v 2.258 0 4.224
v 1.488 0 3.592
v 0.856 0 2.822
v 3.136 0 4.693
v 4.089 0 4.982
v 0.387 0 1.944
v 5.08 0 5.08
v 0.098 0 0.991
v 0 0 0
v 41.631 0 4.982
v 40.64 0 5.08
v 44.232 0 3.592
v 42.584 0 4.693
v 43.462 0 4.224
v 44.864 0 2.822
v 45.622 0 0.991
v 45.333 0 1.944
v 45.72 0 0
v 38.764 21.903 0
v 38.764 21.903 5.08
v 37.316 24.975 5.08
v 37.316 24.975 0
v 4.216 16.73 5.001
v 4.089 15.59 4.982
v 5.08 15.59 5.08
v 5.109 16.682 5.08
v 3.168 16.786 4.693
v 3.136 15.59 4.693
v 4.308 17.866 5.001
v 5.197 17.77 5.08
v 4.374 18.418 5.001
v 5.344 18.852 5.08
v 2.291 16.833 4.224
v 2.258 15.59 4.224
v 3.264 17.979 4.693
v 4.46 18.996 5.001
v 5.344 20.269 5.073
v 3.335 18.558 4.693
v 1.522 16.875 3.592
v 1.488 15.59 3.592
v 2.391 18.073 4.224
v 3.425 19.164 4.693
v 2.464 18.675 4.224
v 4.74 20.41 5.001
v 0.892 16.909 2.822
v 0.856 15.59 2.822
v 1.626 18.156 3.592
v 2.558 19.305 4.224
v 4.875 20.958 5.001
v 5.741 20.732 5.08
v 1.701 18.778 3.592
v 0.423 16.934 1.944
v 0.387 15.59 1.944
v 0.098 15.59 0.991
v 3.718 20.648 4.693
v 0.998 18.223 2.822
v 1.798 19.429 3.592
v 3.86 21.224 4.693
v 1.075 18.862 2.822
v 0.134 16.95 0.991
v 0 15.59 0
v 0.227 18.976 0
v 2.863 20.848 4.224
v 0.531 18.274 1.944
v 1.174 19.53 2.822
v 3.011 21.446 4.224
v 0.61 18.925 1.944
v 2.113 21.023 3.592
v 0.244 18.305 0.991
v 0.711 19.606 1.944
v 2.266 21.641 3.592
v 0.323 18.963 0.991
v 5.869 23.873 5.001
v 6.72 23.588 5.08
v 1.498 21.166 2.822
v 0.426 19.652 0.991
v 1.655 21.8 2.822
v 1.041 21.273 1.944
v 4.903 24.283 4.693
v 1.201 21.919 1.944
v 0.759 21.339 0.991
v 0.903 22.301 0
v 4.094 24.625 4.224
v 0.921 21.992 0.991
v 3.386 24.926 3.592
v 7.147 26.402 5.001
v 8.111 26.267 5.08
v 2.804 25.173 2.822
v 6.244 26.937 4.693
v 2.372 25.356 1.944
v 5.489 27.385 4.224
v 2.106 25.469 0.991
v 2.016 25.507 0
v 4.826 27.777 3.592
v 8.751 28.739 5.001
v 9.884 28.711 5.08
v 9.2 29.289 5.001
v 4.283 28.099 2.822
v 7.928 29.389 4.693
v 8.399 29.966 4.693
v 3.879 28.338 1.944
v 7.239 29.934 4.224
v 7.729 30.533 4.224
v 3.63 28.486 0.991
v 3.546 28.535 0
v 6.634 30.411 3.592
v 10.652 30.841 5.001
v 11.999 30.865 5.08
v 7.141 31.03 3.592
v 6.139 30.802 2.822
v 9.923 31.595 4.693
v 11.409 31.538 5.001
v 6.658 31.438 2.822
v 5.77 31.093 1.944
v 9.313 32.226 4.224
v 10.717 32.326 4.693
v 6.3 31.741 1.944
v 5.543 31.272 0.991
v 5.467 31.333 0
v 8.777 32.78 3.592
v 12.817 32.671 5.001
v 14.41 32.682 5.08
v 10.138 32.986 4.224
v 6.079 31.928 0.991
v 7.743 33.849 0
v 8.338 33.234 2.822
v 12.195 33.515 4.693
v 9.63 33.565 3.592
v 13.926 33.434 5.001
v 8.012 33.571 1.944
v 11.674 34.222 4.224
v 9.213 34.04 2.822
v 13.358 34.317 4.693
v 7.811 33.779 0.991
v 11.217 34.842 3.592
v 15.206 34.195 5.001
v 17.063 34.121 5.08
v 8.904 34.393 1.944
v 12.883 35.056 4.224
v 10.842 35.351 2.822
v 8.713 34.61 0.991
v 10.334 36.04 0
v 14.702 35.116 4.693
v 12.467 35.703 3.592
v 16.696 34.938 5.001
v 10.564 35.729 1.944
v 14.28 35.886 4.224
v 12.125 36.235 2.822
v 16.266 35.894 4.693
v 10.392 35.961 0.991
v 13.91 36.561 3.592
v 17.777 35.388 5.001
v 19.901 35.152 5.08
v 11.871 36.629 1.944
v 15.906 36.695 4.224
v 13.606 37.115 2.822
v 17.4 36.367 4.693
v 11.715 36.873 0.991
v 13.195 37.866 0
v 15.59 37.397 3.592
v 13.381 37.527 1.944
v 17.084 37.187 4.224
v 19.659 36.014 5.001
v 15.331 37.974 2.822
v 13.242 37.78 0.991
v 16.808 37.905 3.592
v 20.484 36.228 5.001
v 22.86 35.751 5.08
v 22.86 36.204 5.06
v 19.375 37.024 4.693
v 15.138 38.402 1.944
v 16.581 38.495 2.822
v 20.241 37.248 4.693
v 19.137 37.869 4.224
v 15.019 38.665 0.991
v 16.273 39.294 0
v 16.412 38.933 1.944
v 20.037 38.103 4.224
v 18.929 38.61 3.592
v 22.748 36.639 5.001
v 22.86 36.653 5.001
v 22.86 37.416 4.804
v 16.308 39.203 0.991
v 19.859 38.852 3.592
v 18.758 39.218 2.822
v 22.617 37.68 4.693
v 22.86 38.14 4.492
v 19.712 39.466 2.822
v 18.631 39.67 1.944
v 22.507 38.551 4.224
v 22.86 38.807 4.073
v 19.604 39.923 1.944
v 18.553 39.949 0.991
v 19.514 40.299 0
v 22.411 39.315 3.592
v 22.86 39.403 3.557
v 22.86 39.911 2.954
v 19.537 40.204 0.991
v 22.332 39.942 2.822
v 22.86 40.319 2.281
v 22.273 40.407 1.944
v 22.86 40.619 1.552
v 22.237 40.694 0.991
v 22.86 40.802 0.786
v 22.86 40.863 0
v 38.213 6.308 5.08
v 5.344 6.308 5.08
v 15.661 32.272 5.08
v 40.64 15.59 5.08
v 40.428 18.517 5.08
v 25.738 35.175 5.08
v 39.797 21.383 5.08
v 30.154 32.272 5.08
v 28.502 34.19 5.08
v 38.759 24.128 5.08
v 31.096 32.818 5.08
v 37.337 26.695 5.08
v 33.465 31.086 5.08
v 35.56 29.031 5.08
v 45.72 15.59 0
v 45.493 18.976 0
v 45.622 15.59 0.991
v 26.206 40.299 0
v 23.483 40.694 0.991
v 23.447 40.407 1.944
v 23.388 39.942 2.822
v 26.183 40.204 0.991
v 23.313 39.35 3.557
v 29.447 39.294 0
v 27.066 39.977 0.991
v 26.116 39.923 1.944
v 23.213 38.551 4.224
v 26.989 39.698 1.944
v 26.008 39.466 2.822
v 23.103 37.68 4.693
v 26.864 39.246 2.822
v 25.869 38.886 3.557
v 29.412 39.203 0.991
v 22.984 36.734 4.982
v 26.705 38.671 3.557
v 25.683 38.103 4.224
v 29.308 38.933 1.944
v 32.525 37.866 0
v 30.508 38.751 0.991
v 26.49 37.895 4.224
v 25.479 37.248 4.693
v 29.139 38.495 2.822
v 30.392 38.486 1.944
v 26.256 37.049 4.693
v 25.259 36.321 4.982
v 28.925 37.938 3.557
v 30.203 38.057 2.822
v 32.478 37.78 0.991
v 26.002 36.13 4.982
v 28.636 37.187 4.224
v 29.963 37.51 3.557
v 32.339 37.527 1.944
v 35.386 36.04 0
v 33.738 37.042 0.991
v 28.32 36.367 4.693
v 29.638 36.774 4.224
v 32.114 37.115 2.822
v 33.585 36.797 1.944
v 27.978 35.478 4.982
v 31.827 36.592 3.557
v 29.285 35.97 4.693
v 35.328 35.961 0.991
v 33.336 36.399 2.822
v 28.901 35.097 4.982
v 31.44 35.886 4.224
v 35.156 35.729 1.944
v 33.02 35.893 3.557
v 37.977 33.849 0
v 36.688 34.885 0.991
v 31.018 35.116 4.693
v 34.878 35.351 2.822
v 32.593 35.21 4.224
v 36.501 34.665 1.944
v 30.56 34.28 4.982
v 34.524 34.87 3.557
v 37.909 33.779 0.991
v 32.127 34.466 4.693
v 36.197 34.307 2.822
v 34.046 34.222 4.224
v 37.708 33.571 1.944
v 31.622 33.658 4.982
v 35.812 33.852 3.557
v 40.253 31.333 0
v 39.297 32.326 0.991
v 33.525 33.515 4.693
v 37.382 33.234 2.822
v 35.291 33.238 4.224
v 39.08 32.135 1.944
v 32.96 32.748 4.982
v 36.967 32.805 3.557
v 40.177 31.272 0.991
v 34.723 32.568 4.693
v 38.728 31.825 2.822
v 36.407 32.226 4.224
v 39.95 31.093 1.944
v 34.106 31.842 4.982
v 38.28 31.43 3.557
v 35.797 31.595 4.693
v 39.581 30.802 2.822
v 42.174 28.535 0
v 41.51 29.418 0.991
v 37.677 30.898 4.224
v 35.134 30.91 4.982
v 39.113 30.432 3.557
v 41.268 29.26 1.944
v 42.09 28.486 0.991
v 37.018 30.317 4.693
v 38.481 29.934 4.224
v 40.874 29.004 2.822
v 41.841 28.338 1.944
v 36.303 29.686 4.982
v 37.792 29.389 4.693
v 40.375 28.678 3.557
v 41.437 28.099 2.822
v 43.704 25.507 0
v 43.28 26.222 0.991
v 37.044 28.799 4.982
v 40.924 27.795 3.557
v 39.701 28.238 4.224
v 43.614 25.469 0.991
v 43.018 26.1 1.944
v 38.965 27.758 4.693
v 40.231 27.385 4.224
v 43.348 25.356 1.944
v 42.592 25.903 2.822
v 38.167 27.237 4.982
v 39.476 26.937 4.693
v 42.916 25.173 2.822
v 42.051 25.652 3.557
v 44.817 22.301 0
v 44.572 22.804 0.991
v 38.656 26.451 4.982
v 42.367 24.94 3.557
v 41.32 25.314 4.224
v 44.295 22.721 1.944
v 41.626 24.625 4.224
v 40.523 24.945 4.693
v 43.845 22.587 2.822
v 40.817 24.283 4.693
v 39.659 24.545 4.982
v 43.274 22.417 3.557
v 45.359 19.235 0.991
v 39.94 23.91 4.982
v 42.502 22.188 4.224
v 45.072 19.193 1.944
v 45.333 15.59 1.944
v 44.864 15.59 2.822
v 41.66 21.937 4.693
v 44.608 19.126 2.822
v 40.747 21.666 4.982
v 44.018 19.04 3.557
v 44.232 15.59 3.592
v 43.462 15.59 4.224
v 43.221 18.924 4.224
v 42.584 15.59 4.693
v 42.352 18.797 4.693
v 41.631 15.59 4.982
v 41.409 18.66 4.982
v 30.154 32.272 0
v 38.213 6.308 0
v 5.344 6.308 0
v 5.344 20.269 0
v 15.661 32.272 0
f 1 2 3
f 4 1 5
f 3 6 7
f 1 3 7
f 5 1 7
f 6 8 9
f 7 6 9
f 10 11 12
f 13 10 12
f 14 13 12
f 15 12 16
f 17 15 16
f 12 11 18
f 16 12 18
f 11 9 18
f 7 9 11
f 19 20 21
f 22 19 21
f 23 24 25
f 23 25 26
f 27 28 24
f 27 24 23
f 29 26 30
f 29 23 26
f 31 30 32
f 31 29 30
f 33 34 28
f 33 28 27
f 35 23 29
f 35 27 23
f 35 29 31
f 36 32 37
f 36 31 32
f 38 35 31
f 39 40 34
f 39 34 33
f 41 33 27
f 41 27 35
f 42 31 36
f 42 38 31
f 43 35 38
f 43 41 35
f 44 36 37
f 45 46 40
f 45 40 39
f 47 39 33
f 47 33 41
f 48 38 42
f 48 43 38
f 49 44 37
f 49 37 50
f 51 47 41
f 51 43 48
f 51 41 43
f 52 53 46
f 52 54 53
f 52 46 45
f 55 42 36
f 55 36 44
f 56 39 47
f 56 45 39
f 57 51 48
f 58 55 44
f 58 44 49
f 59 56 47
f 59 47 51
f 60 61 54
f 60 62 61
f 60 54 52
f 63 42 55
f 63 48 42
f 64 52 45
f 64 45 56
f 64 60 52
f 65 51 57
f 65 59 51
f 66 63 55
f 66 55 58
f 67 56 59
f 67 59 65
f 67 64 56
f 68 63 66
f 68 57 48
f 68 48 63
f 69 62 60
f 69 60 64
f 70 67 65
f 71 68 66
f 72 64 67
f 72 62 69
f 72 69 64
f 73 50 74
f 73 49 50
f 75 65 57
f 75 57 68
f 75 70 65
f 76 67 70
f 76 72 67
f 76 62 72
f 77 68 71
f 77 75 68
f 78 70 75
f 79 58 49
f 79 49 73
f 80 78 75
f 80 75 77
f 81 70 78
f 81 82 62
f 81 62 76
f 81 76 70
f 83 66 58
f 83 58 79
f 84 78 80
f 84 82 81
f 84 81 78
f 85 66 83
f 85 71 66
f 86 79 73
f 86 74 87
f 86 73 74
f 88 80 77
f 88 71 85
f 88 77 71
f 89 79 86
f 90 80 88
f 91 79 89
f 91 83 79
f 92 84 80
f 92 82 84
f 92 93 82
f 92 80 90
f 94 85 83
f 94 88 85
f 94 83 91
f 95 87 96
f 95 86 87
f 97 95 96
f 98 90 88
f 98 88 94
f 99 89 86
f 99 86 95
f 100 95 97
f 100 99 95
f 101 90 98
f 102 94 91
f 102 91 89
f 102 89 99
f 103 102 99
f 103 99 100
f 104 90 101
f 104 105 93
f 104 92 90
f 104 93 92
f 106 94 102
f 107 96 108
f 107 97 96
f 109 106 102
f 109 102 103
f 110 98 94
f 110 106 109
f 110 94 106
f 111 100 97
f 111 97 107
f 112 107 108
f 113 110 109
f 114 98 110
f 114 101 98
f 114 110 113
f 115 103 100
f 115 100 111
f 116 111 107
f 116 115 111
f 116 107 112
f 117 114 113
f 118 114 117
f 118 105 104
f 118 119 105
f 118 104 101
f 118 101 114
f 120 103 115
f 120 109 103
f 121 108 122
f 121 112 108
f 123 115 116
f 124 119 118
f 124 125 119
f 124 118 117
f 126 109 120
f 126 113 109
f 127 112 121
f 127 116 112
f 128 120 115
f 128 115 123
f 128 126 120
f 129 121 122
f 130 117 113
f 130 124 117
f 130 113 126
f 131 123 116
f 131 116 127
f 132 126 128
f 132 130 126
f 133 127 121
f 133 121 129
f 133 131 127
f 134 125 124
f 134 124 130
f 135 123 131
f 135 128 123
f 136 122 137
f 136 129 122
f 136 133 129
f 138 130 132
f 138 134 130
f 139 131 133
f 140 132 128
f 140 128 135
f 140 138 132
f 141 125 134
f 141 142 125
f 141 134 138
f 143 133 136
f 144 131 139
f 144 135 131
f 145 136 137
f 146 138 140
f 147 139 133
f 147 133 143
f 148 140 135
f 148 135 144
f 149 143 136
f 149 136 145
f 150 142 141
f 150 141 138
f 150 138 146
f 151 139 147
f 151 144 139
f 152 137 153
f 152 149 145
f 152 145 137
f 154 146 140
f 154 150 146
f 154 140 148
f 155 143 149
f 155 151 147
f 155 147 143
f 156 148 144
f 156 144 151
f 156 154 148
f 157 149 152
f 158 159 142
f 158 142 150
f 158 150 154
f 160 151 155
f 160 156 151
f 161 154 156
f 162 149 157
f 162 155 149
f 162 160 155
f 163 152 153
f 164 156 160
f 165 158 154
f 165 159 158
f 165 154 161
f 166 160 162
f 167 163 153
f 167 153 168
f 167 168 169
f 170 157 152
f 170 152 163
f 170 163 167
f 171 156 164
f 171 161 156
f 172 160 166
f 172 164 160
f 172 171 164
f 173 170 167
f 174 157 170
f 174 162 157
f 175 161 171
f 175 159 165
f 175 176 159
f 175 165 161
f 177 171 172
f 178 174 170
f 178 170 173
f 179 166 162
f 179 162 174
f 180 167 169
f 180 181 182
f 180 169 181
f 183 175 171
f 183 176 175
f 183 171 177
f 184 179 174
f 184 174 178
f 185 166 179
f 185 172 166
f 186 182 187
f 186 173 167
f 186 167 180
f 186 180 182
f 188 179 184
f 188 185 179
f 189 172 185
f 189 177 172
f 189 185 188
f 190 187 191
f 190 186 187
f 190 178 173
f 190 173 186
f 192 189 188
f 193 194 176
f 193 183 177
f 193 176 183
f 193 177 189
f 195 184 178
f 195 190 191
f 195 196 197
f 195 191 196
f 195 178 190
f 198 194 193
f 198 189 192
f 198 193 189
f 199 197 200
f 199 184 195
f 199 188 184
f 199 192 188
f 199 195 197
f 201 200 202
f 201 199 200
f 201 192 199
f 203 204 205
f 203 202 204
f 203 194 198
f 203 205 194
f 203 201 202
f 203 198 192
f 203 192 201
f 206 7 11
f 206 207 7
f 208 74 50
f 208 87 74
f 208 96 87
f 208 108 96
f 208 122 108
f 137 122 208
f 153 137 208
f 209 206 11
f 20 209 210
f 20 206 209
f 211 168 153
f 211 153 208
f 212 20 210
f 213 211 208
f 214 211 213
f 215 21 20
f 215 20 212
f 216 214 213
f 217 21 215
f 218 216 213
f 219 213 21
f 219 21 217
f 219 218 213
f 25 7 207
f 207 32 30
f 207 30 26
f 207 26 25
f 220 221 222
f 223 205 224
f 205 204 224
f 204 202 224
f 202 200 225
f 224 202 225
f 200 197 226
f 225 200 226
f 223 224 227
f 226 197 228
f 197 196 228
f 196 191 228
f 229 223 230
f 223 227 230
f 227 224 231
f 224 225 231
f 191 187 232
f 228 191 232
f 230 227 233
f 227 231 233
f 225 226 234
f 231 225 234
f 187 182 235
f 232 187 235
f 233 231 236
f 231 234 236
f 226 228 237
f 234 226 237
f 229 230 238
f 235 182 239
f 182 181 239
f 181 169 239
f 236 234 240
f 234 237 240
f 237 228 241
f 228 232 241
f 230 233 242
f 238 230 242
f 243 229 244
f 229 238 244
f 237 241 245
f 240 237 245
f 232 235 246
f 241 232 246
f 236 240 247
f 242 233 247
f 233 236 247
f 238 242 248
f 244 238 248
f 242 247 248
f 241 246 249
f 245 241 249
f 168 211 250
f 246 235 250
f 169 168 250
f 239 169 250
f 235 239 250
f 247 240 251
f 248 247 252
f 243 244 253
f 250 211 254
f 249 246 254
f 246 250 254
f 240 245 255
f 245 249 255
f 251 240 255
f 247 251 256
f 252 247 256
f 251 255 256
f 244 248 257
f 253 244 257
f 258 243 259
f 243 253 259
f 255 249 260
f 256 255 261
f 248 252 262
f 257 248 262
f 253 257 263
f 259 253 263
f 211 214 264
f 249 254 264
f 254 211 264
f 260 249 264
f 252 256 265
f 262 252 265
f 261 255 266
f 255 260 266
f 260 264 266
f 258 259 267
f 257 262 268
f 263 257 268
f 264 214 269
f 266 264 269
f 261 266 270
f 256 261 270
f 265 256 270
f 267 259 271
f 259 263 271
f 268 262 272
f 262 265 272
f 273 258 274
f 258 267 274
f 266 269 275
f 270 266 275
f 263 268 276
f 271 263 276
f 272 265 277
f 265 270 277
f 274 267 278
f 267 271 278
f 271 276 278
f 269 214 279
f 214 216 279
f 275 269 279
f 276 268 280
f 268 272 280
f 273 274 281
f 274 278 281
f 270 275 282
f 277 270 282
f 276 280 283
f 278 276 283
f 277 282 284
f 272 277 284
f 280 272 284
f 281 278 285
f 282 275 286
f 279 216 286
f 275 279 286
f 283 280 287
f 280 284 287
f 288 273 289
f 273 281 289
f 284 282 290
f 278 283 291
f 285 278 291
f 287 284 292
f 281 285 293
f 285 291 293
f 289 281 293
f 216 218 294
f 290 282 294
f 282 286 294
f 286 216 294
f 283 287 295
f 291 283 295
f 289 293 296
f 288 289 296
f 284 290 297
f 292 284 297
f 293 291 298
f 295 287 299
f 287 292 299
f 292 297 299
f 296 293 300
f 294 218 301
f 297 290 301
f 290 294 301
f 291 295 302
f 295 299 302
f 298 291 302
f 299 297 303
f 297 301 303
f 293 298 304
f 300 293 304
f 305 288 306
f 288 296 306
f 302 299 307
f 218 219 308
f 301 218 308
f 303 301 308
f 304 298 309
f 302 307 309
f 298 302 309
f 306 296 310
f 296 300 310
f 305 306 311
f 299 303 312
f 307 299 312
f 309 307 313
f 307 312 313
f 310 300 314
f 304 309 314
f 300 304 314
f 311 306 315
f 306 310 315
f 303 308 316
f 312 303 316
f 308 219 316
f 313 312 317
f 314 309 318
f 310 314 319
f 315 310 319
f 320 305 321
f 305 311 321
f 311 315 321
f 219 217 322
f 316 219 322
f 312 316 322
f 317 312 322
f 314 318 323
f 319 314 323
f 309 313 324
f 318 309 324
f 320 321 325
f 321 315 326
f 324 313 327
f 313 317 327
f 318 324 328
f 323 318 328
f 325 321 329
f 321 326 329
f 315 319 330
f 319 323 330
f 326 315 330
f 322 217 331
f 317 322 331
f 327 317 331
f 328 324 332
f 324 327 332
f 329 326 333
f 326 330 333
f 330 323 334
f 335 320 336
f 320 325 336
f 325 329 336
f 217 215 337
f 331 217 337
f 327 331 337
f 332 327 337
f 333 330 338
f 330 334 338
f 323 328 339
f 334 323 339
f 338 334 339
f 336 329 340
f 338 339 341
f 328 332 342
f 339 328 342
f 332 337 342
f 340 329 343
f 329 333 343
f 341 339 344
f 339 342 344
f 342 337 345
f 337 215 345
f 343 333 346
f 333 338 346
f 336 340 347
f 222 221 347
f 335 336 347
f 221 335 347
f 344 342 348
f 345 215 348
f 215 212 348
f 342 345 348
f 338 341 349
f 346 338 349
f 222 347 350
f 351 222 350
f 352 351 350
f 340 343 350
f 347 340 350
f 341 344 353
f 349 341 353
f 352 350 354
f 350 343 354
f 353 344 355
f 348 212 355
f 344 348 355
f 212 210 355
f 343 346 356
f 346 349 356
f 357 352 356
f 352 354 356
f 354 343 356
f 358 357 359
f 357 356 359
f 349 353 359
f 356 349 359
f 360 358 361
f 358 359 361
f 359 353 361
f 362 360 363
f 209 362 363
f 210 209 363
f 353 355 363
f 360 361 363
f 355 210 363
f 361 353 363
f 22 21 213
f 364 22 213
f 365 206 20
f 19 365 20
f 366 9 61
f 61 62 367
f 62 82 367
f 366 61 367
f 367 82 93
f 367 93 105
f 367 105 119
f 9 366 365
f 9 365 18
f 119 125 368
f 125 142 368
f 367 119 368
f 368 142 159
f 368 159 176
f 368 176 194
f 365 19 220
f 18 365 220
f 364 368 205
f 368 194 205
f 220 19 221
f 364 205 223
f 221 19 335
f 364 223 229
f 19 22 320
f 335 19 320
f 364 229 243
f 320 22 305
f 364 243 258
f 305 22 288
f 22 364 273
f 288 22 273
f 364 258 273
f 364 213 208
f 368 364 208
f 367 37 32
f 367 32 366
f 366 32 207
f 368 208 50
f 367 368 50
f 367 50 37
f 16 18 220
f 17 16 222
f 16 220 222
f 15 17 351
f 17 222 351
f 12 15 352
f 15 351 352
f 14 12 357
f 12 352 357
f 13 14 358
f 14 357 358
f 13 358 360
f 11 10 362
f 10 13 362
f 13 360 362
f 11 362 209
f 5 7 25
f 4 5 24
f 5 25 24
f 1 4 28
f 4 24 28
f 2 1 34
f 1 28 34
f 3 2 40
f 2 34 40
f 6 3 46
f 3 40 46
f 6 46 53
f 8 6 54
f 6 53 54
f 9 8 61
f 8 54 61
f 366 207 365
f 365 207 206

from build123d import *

# Parameters (mm, degrees)
F0_W        = 45.72
F0_H        = 40.9903422
F1_DEPTH    = 5.08
F2_T1_DEPTH = 132.08
F4_DEPTH    = 25.4
F5_T1_DEPTH = 28.2903422
F5_T4_ANGLE = 112.9188061074
F5_T6_ANGLE = 112.9188061074


# Not quite as in the source:
# - a fillet or chamfer that OpenCascade refuses, or shapes differently, is made with other operations: its cross-section is extruded or revolved along the edge and cut away or added


with BuildPart() as f1:
    # F0 (on Top) → F1 (new body)
    with BuildSketch(Plane.XY):
        with Locations((22.86, 20.4951711)):
            Rectangle(F0_W, F0_H)
    extrude(amount=F1_DEPTH)

    # F2: fillet of radius 25.4 on 2 edges, made by hand

    # F2_s2 → F2_t1 (cut)
    with BuildSketch(Plane.XY.offset(-63.5)):
        with BuildLine():
            ThreePointArc((25.4, 40.9903422), (7.4394877579, 33.5508544421), (0, 15.5903422))
            Line((0, 15.5903422), (0, 40.9903422))
            Line((0, 40.9903422), (25.4, 40.9903422))
        make_face()
        with BuildLine():
            ThreePointArc((20.32, 40.9903422), (38.2805122421, 33.5508544421), (45.72, 15.5903422))
            Line((45.72, 15.5903422), (45.72, 40.9903422))
            Line((45.72, 40.9903422), (20.32, 40.9903422))
        make_face()
    extrude(amount=F2_T1_DEPTH, mode=Mode.SUBTRACT)

    # F3 (on face) → F4 (cut)
    with BuildSketch(Plane.XY.offset(5.08)):
        Polygon((5.343540106, 6.3080484979), (38.2127352059, 6.3080484979), (38.763590157, 21.9034794718), (37.315774709, 24.9750651419), (30.1536079496, 32.2724170983), (22.2911257297, 32.2724170983), (15.6609918922, 32.2724170983), (5.343540106, 20.2690735459), align=None)
    extrude(amount=-F4_DEPTH, mode=Mode.SUBTRACT)

    # F5: fillet of radius 5.08 on 4 edges, made by hand

    # F5_s2 → F5_t1 (cut)
    with BuildSketch(Plane.XZ.offset(-15.5903422)):
        with BuildLine():
            ThreePointArc((45.72, 0), (44.2321024484, 3.5921024484), (40.64, 5.08))
            Line((40.64, 5.08), (45.72, 5.08))
            Line((45.72, 5.08), (45.72, 0))
        make_face()
        with BuildLine():
            ThreePointArc((5.08, 5.08), (1.4878975516, 3.5921024484), (0, 0))
            Line((0, 0), (0, 5.08))
            Line((0, 5.08), (5.08, 5.08))
        make_face()
    extrude(amount=F5_T1_DEPTH, mode=Mode.SUBTRACT)

    # F5_s3 → F5_t4 (revolve, cut)
    with BuildSketch(Plane(origin=(22.8304215849, 9.6527795985, 0), x_dir=(0, 0, 1), z_dir=(-0.9210576344, -0.3894262885, 0))):
        with BuildLine():
            ThreePointArc((0, 31.8464615241), (3.5921024484, 30.3585639725), (5.08, 26.7664615241))
            Line((5.08, 26.7664615241), (5.08, 31.8464615241))
            Line((5.08, 31.8464615241), (0, 31.8464615241))
        make_face()
    revolve(axis=Axis((20.3199999999, 15.5903421999, 5.08), (0, 0, -1)), revolution_arc=F5_T4_ANGLE, mode=Mode.SUBTRACT)

    # F5_s5 → F5_t6 (revolve, cut)
    with BuildSketch(Plane.XZ.offset(-15.5903421999)):
        with BuildLine():
            ThreePointArc((5.08, 5.08), (1.4878975516, 3.5921024484), (0, 0))
            Line((0, 0), (0, 5.08))
            Line((0, 5.08), (5.08, 5.08))
        make_face()
    revolve(axis=Axis((25.4000000001, 15.5903421999, 5.08), (0, 0, -1)), revolution_arc=F5_T6_ANGLE, mode=Mode.SUBTRACT)


solid = f1.part
